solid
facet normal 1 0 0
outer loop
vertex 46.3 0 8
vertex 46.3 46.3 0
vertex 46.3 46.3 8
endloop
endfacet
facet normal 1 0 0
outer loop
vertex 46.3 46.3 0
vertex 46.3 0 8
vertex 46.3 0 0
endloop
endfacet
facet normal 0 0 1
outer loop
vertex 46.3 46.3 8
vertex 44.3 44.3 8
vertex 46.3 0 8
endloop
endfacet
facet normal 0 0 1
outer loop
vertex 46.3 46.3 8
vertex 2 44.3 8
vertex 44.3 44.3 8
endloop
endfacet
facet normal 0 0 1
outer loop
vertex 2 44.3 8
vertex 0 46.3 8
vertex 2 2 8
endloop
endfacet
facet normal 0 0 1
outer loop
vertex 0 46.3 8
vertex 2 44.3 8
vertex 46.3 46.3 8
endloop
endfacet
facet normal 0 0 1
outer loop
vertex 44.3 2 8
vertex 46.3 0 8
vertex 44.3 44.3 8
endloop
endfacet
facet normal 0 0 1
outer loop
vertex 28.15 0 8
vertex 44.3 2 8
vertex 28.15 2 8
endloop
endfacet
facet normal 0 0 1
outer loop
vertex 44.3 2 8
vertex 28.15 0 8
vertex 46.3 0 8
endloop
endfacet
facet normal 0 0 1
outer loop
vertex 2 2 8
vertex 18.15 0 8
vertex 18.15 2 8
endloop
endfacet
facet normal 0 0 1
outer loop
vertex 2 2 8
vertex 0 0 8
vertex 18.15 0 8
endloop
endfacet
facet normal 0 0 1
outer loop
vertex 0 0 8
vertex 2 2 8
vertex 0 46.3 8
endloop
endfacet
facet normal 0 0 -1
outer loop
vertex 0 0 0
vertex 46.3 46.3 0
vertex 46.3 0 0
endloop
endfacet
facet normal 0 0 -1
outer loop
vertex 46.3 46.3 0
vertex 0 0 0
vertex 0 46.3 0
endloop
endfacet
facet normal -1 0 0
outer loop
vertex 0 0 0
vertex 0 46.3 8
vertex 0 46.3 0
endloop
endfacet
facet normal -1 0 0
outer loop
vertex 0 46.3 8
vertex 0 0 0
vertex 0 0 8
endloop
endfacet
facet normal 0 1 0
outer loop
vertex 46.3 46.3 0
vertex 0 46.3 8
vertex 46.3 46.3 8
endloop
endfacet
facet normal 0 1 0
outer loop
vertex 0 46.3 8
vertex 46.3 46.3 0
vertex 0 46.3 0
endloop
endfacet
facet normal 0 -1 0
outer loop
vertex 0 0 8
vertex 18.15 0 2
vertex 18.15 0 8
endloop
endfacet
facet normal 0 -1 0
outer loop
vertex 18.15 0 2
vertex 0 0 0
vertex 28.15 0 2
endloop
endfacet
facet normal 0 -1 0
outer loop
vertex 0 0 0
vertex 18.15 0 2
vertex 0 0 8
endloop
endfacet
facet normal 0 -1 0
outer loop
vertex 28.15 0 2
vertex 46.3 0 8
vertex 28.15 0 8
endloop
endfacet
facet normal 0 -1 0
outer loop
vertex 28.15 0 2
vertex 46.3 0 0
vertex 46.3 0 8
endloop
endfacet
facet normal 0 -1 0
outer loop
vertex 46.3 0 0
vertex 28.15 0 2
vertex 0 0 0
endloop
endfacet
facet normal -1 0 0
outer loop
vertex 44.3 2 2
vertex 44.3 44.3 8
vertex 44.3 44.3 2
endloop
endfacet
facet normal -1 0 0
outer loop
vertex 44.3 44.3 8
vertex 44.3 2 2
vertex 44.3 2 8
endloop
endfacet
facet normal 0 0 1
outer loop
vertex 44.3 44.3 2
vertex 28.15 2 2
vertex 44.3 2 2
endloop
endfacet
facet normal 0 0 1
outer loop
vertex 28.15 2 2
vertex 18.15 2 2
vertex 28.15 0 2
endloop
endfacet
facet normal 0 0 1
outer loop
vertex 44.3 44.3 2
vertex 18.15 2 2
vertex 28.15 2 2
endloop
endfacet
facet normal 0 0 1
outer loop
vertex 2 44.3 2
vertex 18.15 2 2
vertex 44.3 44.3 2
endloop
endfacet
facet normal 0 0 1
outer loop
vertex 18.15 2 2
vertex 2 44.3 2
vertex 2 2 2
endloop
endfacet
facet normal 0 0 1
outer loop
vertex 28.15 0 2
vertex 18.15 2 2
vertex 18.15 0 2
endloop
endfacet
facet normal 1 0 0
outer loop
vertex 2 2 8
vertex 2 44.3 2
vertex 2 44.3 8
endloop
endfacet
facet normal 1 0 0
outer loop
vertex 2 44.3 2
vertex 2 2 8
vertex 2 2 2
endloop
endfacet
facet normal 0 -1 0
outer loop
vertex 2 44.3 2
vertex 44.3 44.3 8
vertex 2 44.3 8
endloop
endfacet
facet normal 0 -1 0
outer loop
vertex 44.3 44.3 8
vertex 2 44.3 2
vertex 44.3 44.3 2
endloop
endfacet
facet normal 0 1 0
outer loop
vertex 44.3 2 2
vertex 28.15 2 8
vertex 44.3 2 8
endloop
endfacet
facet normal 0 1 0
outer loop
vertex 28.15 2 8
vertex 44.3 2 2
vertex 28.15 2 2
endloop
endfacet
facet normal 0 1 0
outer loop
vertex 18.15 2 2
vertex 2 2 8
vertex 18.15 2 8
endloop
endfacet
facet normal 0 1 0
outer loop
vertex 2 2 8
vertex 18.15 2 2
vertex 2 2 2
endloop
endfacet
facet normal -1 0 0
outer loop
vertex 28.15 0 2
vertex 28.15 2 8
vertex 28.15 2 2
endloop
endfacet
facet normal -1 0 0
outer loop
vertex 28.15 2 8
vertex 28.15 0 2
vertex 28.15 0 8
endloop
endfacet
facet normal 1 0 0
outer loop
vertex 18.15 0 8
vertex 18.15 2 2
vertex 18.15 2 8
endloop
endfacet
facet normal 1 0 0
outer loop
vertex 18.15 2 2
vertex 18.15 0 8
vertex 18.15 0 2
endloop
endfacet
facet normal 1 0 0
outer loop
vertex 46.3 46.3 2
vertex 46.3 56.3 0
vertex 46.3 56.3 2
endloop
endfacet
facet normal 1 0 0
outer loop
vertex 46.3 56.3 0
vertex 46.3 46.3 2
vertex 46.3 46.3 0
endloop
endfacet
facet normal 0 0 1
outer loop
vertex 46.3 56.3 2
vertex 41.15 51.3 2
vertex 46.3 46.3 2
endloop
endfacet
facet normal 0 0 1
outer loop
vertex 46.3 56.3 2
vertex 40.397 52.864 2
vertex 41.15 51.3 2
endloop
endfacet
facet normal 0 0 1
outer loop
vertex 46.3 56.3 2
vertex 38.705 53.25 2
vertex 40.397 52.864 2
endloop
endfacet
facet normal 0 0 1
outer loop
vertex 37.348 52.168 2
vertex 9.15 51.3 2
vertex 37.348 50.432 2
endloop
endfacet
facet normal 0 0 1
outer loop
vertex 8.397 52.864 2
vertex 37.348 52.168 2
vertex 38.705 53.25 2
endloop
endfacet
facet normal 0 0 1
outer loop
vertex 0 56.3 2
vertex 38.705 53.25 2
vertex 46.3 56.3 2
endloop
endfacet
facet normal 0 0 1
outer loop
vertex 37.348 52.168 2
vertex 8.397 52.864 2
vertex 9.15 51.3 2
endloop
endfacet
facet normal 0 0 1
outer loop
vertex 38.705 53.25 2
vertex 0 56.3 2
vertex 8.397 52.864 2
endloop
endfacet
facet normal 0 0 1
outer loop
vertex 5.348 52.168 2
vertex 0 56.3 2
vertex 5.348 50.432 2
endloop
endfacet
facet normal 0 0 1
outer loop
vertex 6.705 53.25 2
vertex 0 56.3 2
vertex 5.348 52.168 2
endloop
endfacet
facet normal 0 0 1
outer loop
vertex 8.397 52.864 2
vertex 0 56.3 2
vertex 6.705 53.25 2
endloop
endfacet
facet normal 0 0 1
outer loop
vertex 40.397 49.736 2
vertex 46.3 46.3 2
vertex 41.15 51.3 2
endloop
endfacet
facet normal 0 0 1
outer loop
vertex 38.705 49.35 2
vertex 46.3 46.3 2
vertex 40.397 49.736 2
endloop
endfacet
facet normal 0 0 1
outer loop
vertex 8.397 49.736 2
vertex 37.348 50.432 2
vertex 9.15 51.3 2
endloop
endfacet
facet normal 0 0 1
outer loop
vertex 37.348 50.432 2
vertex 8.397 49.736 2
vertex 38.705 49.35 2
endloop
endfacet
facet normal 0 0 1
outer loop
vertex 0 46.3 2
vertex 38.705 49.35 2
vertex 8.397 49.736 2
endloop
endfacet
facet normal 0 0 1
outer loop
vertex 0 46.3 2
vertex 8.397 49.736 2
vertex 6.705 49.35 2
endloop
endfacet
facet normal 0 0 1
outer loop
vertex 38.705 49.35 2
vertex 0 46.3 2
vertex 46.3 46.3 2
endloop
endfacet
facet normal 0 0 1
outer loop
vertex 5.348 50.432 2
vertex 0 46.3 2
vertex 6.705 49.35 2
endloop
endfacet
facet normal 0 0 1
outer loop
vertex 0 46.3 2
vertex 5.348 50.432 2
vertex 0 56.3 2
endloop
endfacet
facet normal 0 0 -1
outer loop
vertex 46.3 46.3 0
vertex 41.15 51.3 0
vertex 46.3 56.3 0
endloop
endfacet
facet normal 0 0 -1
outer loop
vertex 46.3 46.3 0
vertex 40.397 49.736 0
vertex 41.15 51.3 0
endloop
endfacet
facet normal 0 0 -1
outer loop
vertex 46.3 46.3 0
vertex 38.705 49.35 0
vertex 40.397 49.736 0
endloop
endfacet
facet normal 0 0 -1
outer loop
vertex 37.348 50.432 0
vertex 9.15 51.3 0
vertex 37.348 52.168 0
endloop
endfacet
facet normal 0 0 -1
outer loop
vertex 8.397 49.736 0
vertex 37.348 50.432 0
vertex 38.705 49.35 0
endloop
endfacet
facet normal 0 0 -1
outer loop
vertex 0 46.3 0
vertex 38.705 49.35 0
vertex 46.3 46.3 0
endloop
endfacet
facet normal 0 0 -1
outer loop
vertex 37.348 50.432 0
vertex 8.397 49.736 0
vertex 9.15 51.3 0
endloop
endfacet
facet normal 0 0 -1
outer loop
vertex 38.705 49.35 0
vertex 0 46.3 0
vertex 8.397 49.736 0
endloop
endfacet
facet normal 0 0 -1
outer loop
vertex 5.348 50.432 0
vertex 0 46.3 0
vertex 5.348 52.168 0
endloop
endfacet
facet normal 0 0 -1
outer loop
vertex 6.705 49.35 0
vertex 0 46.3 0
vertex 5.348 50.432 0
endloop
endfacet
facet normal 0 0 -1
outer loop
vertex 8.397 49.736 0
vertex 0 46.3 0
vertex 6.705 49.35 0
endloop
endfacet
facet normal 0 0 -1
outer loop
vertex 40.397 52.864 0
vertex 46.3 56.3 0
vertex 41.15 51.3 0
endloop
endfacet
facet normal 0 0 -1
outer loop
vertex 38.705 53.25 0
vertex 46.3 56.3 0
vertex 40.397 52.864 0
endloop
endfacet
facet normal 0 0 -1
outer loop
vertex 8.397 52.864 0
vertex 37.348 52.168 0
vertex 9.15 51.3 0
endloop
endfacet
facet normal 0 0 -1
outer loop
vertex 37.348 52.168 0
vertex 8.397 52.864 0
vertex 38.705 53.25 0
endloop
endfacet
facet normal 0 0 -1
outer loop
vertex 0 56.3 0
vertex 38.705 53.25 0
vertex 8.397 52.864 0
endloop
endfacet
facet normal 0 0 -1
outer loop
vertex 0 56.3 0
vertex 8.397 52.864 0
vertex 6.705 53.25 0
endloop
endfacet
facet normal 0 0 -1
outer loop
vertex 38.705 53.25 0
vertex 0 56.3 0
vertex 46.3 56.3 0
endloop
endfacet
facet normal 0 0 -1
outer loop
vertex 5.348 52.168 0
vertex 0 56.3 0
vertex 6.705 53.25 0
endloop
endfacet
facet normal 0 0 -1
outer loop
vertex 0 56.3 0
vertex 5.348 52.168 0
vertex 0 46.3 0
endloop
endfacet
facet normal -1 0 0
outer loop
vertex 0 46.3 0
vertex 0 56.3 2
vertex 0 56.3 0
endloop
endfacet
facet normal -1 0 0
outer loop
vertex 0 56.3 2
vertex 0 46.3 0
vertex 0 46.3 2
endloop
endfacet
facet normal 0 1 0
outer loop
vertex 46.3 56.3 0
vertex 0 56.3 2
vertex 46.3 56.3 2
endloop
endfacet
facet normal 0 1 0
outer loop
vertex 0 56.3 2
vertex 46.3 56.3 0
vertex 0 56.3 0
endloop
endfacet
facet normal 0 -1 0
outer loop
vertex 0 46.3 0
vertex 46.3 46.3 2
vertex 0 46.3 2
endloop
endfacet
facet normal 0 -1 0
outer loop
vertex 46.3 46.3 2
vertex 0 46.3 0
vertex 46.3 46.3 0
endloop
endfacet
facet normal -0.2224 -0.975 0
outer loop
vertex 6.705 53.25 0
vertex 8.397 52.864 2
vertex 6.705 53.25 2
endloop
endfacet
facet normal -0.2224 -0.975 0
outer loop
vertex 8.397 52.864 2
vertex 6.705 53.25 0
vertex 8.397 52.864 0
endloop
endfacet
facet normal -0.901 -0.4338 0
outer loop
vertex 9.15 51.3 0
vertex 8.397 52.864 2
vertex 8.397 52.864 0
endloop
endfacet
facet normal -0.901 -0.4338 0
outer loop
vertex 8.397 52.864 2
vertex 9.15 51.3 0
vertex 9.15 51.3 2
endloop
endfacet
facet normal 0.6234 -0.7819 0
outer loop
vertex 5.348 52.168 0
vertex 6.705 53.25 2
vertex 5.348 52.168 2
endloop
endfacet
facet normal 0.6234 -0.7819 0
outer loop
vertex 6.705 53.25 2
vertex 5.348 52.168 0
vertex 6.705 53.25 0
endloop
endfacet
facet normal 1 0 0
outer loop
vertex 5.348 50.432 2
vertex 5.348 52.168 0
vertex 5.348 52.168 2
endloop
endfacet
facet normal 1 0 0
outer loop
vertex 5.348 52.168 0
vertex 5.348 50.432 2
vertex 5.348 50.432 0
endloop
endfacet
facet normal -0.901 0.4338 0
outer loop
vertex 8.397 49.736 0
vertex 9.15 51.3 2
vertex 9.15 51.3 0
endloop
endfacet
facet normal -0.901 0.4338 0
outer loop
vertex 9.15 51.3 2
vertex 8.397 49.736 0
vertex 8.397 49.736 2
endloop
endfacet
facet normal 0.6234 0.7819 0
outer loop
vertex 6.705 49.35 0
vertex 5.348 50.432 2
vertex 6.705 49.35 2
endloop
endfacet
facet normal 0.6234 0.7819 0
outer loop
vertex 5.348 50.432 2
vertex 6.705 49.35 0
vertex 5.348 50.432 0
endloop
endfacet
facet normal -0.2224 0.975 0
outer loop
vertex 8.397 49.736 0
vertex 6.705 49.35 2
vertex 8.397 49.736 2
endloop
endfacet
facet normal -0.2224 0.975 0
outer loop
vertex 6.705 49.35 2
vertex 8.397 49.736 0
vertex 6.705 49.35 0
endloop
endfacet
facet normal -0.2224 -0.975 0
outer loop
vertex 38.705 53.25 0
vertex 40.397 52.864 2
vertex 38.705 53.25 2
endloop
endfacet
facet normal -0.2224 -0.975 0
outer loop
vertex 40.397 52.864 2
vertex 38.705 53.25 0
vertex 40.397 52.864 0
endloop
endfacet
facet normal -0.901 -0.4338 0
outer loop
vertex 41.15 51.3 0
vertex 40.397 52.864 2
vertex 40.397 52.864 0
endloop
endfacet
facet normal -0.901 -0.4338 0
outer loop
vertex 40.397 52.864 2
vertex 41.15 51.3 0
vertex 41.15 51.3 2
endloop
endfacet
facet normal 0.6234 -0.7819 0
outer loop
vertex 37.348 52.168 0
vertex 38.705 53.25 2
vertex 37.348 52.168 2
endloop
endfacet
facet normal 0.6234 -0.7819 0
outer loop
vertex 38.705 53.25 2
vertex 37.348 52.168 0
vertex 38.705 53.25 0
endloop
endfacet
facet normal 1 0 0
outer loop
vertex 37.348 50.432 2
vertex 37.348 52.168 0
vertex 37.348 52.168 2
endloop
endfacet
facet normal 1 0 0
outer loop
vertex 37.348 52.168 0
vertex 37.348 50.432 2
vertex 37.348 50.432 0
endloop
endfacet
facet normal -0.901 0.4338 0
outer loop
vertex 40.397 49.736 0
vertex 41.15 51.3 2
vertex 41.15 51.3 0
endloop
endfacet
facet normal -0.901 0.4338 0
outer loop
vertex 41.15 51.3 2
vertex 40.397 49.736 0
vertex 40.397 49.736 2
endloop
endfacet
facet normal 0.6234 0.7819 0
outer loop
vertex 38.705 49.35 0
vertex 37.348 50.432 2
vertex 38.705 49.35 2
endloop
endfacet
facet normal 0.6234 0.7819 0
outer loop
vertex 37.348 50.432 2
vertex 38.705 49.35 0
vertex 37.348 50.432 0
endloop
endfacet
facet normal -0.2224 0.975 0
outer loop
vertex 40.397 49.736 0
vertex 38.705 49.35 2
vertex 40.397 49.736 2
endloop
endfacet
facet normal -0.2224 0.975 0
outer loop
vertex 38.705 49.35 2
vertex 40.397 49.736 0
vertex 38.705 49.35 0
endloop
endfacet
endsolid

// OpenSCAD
$nema_side = 42.3;
$cup_height = 8;
$cup_wall = 2;
$cut_out = 10;

$bolt_inset = 4;
$bolt_radius = 2;
$fan_x = 40;

$total_side = $nema_side + 2 * $cup_wall;
$mid_point = $total_side/2;

$hole_from_midpoint = $fan_x/2 - $bolt_inset;

module make_motor_cup() {
   union() {
		difference() {
	      cube([$nema_side+$cup_wall*2,
	            $nema_side+$cup_wall*2,
	            $cup_height]);
	      translate([$cup_wall,$cup_wall,$cup_wall]) {
	         cube([$nema_side, 
	               $nema_side, 
	               $cup_height-$cup_wall+1]);
	      }
	      translate([$nema_side/2-$cut_out/2+$cup_wall,-1,$cup_wall]) {
	          cube([$cut_out,$cup_wall+2,$cup_height+2]);
	      }
	   }
		translate([0,$nema_side+2*$cup_wall,0]) {
         difference() {
            cube([$nema_side+2*$cup_wall, 10, $cup_wall]);
            translate([$mid_point - $hole_from_midpoint,5,-1]) {
               cylinder(r=$bolt_radius, h=6);
            }
            translate([$mid_point + $hole_from_midpoint,5,-1]) {
               cylinder(r=$bolt_radius, h=6);
            }
         }
      }
   }
}

module make_parts() {
	make_motor_cup();
}

make_parts();
